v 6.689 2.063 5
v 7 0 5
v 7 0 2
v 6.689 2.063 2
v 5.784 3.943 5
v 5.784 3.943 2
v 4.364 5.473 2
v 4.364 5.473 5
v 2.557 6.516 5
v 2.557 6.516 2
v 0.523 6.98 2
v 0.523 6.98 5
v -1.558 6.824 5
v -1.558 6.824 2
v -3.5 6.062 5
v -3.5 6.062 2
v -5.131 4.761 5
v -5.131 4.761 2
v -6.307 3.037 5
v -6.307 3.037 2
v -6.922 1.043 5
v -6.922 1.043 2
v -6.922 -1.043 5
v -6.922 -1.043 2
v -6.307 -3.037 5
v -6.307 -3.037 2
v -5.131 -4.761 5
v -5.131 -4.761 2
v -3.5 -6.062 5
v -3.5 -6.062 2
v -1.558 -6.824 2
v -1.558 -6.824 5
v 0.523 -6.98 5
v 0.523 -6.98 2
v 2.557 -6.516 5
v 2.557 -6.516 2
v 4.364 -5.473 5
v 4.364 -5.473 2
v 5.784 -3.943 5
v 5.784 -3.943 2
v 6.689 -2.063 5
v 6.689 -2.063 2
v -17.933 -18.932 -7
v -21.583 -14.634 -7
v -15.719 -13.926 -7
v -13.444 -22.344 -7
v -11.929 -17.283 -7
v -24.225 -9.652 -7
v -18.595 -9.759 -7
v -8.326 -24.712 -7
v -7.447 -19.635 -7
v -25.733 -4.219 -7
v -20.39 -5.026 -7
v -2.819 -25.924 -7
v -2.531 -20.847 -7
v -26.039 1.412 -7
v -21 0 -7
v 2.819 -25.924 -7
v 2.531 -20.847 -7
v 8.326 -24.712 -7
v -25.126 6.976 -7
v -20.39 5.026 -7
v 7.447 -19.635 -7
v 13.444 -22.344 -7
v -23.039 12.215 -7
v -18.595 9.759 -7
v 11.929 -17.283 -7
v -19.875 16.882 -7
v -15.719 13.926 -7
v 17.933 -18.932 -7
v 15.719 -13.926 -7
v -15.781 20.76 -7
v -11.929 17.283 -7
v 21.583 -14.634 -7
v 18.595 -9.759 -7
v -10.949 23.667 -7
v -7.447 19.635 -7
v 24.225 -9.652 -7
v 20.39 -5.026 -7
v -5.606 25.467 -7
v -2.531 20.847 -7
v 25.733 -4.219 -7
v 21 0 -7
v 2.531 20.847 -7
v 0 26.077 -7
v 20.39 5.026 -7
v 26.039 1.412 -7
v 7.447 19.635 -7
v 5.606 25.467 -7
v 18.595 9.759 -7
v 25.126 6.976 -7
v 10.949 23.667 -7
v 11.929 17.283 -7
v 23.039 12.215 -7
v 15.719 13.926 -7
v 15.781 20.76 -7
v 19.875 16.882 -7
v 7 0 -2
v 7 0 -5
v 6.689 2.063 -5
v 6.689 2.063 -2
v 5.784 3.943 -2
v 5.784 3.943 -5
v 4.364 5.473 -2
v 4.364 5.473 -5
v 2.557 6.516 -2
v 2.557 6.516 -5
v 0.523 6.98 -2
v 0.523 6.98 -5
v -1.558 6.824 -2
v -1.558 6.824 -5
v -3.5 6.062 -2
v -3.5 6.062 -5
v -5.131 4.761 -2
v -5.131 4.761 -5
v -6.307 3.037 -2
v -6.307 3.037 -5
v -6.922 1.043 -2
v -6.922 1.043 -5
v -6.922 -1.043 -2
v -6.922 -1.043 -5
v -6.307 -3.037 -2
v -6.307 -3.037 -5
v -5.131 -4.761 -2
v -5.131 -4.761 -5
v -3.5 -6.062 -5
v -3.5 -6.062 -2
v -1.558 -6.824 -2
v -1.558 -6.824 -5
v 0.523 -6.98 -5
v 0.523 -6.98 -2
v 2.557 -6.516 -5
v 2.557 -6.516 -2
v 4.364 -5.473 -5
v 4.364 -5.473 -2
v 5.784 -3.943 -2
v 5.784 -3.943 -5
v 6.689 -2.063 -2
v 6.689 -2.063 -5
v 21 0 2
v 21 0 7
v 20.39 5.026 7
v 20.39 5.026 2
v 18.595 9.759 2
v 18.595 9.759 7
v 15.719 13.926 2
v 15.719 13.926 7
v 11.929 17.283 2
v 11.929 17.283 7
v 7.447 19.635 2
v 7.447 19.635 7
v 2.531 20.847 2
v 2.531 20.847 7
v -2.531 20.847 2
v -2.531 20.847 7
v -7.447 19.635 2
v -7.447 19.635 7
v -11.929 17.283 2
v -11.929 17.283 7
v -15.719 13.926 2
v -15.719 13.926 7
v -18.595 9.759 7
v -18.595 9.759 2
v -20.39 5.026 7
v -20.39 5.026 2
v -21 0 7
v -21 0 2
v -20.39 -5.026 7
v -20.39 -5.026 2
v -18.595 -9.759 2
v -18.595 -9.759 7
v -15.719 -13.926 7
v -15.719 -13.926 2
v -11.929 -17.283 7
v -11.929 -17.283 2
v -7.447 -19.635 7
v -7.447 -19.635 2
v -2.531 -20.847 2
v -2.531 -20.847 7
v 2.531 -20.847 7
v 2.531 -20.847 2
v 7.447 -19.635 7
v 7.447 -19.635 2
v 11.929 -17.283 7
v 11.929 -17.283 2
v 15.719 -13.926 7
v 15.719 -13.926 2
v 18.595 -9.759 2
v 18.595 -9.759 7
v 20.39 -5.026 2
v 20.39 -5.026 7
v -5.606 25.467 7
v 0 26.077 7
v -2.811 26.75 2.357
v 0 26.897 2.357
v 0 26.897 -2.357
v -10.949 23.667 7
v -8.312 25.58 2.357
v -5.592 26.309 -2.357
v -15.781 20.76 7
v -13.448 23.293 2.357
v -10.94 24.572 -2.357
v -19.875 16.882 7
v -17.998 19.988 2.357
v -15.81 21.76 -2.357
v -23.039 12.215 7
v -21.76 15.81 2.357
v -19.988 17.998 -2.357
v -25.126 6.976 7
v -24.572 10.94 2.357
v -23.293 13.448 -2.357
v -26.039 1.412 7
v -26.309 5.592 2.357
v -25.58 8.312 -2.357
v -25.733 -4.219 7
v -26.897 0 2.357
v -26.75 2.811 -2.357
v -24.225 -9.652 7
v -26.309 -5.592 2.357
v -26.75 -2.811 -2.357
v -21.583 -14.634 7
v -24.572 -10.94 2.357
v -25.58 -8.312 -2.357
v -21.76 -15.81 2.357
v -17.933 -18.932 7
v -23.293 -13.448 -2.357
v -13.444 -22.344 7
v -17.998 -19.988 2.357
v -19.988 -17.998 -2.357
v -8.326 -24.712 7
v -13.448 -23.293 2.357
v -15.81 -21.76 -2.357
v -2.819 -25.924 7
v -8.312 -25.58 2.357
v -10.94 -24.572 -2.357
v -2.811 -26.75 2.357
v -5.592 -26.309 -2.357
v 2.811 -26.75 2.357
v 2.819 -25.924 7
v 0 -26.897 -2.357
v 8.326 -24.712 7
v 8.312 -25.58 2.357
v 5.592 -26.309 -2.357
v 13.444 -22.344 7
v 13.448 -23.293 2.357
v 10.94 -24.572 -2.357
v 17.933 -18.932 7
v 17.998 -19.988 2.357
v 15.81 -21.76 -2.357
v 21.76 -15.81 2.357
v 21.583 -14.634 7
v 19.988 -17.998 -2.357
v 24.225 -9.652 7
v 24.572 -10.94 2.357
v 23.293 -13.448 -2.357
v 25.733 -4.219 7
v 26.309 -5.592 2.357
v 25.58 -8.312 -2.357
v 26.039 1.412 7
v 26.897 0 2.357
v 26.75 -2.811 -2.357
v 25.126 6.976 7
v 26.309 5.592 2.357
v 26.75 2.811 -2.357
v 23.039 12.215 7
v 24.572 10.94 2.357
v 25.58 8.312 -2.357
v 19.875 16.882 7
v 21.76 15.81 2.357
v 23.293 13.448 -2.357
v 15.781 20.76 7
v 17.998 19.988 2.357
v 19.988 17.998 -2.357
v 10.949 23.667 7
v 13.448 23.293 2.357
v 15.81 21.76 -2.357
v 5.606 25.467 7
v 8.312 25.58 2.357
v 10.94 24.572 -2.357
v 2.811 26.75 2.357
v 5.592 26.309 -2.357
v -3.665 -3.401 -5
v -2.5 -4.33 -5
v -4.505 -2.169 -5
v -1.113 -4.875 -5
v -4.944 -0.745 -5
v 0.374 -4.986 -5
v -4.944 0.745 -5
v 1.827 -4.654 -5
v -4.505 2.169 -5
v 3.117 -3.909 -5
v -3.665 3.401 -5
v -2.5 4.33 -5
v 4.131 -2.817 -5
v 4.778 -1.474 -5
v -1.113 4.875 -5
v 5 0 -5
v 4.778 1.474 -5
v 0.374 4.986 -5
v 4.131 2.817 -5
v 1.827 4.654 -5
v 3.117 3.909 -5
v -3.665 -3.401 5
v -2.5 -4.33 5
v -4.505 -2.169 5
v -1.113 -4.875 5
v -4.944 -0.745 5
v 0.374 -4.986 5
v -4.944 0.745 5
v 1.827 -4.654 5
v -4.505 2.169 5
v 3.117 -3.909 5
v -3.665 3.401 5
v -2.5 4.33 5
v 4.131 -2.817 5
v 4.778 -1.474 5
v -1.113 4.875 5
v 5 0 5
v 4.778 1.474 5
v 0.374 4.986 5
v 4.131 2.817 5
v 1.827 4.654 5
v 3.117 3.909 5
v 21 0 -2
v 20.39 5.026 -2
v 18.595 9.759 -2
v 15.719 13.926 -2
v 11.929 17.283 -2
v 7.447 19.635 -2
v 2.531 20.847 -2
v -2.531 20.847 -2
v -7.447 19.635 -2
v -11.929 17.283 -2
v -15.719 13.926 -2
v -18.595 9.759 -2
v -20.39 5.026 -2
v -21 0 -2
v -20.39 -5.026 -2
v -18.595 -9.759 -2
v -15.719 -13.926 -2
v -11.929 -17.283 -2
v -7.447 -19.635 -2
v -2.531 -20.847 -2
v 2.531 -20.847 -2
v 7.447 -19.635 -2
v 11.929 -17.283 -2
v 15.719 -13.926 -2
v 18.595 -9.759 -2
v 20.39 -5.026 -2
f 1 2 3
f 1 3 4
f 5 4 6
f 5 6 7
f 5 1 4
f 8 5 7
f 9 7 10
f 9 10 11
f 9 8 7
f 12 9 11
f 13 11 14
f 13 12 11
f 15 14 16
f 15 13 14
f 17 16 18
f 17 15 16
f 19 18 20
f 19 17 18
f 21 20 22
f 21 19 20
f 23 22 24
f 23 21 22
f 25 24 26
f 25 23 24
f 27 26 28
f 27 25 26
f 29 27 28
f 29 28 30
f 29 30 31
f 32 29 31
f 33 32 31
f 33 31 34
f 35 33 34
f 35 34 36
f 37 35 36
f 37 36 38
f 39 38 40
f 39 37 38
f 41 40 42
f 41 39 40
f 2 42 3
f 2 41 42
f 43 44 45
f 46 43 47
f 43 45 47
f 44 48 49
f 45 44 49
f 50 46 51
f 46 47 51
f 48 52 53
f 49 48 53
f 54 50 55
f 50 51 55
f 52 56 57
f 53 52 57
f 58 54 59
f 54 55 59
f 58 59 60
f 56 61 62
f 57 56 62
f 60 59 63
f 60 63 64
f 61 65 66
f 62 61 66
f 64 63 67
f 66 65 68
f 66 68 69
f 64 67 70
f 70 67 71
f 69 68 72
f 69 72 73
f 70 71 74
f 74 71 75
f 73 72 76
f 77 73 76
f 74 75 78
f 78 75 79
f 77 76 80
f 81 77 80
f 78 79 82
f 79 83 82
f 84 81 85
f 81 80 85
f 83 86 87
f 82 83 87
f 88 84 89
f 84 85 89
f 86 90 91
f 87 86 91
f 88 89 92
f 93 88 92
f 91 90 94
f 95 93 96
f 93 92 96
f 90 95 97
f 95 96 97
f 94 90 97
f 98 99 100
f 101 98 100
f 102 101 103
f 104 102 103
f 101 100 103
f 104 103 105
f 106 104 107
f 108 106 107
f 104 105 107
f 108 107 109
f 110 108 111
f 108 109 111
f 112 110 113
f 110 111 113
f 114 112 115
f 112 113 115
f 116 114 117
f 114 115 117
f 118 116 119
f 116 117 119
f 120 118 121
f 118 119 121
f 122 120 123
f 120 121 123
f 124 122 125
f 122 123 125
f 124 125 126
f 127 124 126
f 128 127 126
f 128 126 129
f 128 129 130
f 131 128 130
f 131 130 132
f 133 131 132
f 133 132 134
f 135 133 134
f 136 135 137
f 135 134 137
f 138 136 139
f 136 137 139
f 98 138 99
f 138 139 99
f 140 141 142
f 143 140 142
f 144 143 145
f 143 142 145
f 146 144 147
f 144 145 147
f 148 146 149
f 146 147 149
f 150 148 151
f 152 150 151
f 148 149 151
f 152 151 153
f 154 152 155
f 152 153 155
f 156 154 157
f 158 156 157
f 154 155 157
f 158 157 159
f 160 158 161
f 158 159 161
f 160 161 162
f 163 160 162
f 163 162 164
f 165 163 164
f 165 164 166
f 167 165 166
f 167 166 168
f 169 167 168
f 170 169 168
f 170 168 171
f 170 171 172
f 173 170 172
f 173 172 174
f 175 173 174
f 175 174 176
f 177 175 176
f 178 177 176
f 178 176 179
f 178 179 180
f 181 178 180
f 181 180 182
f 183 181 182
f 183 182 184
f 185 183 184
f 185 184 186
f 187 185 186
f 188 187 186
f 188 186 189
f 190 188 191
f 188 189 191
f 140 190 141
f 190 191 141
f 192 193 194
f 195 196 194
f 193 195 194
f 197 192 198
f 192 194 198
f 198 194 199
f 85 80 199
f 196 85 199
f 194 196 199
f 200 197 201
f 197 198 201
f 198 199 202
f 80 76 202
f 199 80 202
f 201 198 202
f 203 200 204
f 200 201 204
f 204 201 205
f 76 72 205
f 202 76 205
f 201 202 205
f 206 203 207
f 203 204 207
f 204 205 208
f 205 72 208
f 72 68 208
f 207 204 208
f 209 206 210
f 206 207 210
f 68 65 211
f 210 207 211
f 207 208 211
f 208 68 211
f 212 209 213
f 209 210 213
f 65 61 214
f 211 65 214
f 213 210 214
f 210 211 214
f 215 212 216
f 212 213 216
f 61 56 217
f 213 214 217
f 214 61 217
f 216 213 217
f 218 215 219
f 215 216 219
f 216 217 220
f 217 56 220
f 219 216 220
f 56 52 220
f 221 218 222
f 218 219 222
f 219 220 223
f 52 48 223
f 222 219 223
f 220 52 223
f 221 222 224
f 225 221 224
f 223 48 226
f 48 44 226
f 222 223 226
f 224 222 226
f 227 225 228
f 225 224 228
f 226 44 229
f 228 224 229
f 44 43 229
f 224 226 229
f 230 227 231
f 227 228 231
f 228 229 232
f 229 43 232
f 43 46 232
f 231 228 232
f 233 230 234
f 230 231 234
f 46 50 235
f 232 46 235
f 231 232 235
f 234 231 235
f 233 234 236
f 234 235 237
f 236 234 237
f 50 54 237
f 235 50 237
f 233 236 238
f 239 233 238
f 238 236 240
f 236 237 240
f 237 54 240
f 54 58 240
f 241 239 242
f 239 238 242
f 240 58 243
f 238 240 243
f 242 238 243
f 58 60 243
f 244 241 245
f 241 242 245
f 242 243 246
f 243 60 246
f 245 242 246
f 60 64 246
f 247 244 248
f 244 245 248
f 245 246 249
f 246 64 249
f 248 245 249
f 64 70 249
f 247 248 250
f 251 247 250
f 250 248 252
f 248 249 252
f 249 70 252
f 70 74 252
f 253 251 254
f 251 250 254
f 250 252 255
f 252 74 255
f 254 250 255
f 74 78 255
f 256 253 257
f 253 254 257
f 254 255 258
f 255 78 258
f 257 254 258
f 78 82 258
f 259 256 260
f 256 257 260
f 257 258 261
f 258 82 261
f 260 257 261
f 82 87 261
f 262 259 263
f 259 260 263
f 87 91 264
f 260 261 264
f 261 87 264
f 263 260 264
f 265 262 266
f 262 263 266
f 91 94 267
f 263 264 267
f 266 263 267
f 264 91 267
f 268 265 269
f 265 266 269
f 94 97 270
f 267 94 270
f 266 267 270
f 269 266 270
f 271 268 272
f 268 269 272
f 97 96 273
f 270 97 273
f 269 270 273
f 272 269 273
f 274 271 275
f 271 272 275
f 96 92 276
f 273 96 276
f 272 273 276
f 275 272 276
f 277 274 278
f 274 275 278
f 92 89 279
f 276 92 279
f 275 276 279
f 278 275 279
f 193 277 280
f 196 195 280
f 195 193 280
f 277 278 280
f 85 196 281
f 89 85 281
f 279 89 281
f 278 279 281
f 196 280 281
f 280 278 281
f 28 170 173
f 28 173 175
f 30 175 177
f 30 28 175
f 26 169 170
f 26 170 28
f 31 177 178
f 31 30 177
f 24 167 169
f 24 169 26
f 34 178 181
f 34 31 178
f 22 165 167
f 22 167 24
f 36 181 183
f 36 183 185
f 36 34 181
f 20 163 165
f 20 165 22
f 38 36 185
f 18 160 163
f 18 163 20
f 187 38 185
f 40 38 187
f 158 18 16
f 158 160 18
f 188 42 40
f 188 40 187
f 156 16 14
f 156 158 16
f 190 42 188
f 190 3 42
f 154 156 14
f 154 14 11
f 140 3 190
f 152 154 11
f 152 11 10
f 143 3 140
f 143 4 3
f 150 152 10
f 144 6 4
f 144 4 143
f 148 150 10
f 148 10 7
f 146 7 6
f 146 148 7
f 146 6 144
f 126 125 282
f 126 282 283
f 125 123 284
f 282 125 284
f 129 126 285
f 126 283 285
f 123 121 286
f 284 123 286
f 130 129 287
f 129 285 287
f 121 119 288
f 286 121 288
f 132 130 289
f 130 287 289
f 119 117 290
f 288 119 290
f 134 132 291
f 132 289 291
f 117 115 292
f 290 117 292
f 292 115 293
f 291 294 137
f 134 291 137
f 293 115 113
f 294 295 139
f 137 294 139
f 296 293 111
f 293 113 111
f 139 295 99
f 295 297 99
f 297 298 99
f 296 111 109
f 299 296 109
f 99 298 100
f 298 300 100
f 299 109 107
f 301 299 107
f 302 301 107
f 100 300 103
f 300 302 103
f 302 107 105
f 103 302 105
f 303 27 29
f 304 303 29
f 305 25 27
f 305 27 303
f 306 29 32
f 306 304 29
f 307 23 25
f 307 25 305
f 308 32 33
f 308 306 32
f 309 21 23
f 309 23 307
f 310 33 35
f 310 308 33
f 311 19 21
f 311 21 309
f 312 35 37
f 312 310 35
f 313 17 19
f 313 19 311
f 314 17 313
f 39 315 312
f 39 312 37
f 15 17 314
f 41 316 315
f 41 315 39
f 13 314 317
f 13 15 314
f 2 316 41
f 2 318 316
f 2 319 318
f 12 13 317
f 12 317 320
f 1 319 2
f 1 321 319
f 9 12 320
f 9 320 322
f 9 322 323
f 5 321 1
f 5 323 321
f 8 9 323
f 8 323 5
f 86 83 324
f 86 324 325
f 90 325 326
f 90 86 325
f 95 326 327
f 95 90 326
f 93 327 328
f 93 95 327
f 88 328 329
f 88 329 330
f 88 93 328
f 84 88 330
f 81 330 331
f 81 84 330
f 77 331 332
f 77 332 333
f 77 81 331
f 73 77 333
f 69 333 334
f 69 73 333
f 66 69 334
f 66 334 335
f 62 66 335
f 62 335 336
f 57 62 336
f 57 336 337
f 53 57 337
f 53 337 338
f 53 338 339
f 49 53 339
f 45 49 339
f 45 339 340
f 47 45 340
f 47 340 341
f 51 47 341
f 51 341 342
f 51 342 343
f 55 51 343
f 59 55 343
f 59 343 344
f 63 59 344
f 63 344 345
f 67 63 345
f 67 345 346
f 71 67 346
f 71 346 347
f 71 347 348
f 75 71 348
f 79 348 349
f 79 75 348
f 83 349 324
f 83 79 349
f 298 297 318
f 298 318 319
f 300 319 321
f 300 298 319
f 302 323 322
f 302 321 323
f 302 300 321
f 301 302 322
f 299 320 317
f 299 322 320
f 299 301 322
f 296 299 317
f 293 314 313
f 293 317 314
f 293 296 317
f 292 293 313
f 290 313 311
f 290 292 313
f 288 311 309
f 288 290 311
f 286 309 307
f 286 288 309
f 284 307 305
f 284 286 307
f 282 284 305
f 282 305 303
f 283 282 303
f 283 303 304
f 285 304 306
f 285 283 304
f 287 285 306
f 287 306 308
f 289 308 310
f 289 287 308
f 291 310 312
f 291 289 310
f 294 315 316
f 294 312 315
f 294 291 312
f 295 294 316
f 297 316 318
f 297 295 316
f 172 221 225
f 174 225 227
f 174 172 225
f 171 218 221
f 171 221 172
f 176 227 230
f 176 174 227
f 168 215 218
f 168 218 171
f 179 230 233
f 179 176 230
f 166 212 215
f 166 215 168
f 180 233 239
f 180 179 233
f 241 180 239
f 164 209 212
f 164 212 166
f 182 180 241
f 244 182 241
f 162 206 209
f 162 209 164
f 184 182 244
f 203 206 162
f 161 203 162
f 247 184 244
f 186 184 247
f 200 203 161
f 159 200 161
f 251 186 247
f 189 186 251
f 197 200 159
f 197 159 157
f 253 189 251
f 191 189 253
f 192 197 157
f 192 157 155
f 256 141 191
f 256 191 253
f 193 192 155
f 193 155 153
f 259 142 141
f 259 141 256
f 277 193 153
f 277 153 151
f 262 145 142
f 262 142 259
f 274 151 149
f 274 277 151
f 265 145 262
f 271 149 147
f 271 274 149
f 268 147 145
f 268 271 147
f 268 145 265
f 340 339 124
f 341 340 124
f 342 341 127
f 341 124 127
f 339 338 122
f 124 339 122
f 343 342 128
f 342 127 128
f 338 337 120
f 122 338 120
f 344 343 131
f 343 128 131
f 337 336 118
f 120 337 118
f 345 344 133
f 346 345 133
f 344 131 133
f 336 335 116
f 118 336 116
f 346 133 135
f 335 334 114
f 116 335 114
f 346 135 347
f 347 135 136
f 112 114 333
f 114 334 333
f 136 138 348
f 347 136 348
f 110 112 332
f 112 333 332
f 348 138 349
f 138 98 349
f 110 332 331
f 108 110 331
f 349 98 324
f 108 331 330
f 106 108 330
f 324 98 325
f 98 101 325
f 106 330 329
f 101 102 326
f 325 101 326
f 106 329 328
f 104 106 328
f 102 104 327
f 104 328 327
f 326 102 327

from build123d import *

# Parameters (mm, degrees)
SKETCH_1_R          = 27
SKETCH_1_R_2        = 5
EXTRUDE_1_DEPTH     = 7
SKETCH_4_R          = 21
CUT_EXTRUDE_1_DEPTH = 2
SKETCH_5_R          = 21
SKETCH_5_R_2        = 7
CUT_EXTRUDE_2_DEPTH = 3


with BuildPart() as part:
    # 草图1 → 凸台-拉伸1 (new, symmetric)
    with BuildSketch(Plane.XY):
        Circle(SKETCH_1_R)
        Circle(SKETCH_1_R_2, mode=Mode.SUBTRACT)
    extrude(amount=EXTRUDE_1_DEPTH, both=True)

    # 草图2 → 切除-旋转1 (revolve, cut)
    with BuildSketch(Plane(origin=(0, 0, 0), x_dir=(0, 0, -1), z_dir=(1, 0, 0))):
        with BuildLine():
            Line((-6.5814e-13, 27), (-7, 27))
            Line((-7, 27), (-7, 26.076809620810586))
            ThreePointArc((-7.0000000000000195, 26.07680962081059), (-3.530307368921202, 26.768207446165324), (-6.5782e-13, 27))
        make_face()
        with BuildLine():
            Line((7, 27), (-6.5814e-13, 27))
            ThreePointArc((-6.5782e-13, 27), (3.5303073689204805, 26.76820744616542), (6.999999999999878, 26.076809620810625))
            Line((7, 26.076809620810657), (7, 27))
        make_face()
    revolve(axis=Axis((0, 0, -7), (0, 0, 1)), mode=Mode.SUBTRACT)

    # 草图4 → 切除-拉伸1 (cut)
    with BuildSketch(Plane.XY.offset(7)):
        Circle(SKETCH_4_R)
    cut_extrude_1 = extrude(amount=-CUT_EXTRUDE_1_DEPTH, mode=Mode.SUBTRACT)

    # 草图5 → 切除-拉伸2 (cut)
    with BuildSketch(Plane.XY.offset(5)):
        Circle(SKETCH_5_R)
        Circle(SKETCH_5_R_2, mode=Mode.SUBTRACT)
    cut_extrude_2 = extrude(amount=-CUT_EXTRUDE_2_DEPTH, mode=Mode.SUBTRACT)

    # 镜向1: 切除-拉伸1, 切除-拉伸2 across plane
    add(cut_extrude_1.mirror(Plane.XY), mode=Mode.SUBTRACT)
    add(cut_extrude_2.mirror(Plane.XY), mode=Mode.SUBTRACT)


solid = part.part
